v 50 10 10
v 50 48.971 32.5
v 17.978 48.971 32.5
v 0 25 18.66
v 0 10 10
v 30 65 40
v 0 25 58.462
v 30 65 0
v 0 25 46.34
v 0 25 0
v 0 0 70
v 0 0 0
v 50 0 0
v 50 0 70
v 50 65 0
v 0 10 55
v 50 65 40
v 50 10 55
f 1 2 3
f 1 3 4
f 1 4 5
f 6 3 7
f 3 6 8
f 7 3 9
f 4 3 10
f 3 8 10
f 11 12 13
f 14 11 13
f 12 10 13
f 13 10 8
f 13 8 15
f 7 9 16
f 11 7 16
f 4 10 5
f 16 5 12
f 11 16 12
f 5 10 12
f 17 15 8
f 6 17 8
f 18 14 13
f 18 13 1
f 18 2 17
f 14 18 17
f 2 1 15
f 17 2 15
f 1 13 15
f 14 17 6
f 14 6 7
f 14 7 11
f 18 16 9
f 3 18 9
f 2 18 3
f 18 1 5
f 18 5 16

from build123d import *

# Parameters (mm, degrees)
EXTRUDE1_DEPTH     = 70
CUT_EXTRUDE1_DEPTH = 51


with BuildPart() as part:
    # Sketch1 → Extrude1 (new body)
    with BuildSketch(Plane.XY):
        Polygon((30, 65), (0, 25), (0, 0), (50, 0), (50, 65), align=None)
    extrude(amount=EXTRUDE1_DEPTH)

    # Sketch2 → Cut-Extrude1 (cut, through all)
    with BuildSketch(Plane(origin=(50, 0, 0), x_dir=(0, 0, -1), z_dir=(1, 0, 0))):
        Polygon((-70, 0), (-70, 65), (-40, 65), align=None)
        Polygon((-32.5, 48.97114317), (-10, 10), (-55, 10), align=None)
    extrude(amount=-CUT_EXTRUDE1_DEPTH, mode=Mode.SUBTRACT)


solid = part.part
